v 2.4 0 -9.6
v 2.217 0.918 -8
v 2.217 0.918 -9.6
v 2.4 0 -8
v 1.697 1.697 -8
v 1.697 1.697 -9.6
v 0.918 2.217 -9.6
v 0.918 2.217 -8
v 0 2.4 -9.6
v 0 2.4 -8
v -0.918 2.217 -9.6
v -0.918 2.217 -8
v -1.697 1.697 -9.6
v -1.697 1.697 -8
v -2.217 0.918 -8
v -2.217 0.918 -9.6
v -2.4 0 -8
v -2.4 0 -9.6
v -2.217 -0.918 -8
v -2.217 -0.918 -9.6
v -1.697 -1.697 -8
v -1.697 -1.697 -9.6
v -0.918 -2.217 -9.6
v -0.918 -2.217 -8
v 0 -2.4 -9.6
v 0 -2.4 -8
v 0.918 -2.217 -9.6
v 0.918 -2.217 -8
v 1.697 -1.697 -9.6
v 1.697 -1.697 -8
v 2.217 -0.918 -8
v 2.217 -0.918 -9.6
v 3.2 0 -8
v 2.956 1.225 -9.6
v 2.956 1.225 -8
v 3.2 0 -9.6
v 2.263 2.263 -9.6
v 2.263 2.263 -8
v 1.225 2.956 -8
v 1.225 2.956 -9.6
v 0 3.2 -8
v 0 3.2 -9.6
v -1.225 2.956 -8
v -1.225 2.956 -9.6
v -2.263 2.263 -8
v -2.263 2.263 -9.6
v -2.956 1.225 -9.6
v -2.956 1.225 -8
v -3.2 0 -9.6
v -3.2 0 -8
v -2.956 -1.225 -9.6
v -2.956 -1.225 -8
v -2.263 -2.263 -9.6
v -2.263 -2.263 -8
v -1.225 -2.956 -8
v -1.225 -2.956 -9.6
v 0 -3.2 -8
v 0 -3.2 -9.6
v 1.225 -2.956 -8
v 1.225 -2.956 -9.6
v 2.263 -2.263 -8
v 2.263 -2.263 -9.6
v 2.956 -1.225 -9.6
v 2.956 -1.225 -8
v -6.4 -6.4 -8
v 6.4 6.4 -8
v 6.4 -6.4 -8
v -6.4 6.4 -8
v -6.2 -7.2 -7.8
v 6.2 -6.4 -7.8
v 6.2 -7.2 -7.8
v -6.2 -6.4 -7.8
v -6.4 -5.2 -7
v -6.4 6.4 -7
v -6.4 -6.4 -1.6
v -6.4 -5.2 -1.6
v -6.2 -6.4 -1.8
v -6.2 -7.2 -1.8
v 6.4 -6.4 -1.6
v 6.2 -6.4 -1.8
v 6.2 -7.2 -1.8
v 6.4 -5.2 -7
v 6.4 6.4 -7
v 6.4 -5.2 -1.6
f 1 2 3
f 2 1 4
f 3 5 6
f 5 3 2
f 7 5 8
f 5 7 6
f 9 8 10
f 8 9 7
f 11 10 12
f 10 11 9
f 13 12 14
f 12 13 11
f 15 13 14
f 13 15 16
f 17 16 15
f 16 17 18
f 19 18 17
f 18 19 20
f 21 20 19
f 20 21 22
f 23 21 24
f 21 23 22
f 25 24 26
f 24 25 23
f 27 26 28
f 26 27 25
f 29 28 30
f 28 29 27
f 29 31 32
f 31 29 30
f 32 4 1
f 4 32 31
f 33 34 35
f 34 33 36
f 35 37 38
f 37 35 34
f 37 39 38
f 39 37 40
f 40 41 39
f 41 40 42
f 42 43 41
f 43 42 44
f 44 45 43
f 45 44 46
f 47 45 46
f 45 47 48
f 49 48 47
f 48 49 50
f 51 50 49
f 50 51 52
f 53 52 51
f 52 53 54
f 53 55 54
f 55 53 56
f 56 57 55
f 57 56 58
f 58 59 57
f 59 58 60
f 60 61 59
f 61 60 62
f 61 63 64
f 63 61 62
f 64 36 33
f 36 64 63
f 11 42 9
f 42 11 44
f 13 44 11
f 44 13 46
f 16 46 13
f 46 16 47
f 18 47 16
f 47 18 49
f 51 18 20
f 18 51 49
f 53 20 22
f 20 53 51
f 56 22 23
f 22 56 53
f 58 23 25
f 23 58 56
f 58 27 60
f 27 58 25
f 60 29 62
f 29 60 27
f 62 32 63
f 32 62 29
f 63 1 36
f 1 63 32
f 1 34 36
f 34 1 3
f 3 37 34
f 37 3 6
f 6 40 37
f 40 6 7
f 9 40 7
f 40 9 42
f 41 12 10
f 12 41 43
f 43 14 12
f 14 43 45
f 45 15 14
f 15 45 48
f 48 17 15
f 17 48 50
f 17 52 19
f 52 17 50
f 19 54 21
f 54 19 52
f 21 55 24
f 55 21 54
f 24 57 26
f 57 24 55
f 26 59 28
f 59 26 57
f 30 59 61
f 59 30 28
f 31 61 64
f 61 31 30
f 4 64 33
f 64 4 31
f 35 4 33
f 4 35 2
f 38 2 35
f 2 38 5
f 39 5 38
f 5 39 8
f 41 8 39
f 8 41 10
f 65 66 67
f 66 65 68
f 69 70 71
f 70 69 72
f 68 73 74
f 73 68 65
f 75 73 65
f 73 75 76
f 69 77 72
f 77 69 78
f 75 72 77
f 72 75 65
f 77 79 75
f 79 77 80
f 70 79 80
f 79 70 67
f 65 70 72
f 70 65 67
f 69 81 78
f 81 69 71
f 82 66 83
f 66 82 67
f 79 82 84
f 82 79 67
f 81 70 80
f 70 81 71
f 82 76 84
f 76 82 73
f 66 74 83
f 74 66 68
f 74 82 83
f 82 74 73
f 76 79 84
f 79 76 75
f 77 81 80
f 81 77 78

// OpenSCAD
// file: ../p/4-4ring3.scad
use <../lib.scad>
function ldraw_lib__4_4ring3() = [
// 0 Ring  3 x 1.0
// 0 Name: 4-4ring3.dat
// 0 Author: James Jessiman
// 0 !LDRAW_ORG Primitive UPDATE 2009-01
// 0 !LICENSE Licensed under CC BY 4.0 : see CAreadme.txt
// 
// 0 BFC CERTIFY CCW
  [0,"BFC","CERTIFY"],
  [0,"BFC","CCW"],
// 
// 0 !HISTORY 1998-12-15 [PTadmin] Official Update 1998-10
// 0 !HISTORY 2002-04-05 [hafhead] Added BFC statement
// 0 !HISTORY 2002-04-25 [PTadmin] Official Update 2002-02
// 0 !HISTORY 2007-06-24 [PTadmin] Header formatted for Contributor Agreement
// 0 !HISTORY 2008-07-01 [PTadmin] Official Update 2008-01
// 0 !HISTORY 2008-08-26 [cwdee] Switch polygon winding and rename
// 0 !HISTORY 2009-05-02 [PTadmin] Official Update 2009-01
// 
// 
// 4 16 -1.5308 0 3.6956 -1.1481 0 2.7717 0 0 3 0 0 4
  [4,16,-1.5308,0,3.6956,-1.1481,0,2.7717,0,0,3,0,0,4],
// 4 16 -2.8284 0 2.8284 -2.1213 0 2.1213 -1.1481 0 2.7717 -1.5308 0 3.6956
  [4,16,-2.8284,0,2.8284,-2.1213,0,2.1213,-1.1481,0,2.7717,-1.5308,0,3.6956],
// 4 16 -3.6956 0 1.5308 -2.7717 0 1.1481 -2.1213 0 2.1213 -2.8284 0 2.8284
  [4,16,-3.6956,0,1.5308,-2.7717,0,1.1481,-2.1213,0,2.1213,-2.8284,0,2.8284],
// 4 16 -4 0 0 -3 0 0 -2.7717 0 1.1481 -3.6956 0 1.5308
  [4,16,-4,0,0,-3,0,0,-2.7717,0,1.1481,-3.6956,0,1.5308],
// 4 16 -3.6956 0 -1.5308 -2.7717 0 -1.1481 -3 0 0 -4 0 0
  [4,16,-3.6956,0,-1.5308,-2.7717,0,-1.1481,-3,0,0,-4,0,0],
// 4 16 -2.8284 0 -2.8284 -2.1213 0 -2.1213 -2.7717 0 -1.1481 -3.6956 0 -1.5308
  [4,16,-2.8284,0,-2.8284,-2.1213,0,-2.1213,-2.7717,0,-1.1481,-3.6956,0,-1.5308],
// 4 16 -1.5308 0 -3.6956 -1.1481 0 -2.7717 -2.1213 0 -2.1213 -2.8284 0 -2.8284
  [4,16,-1.5308,0,-3.6956,-1.1481,0,-2.7717,-2.1213,0,-2.1213,-2.8284,0,-2.8284],
// 4 16 0 0 -4 0 0 -3 -1.1481 0 -2.7717 -1.5308 0 -3.6956
  [4,16,0,0,-4,0,0,-3,-1.1481,0,-2.7717,-1.5308,0,-3.6956],
// 4 16 1.5308 0 -3.6956 1.1481 0 -2.7717 0 0 -3 0 0 -4
  [4,16,1.5308,0,-3.6956,1.1481,0,-2.7717,0,0,-3,0,0,-4],
// 4 16 2.8284 0 -2.8284 2.1213 0 -2.1213 1.1481 0 -2.7717 1.5308 0 -3.6956
  [4,16,2.8284,0,-2.8284,2.1213,0,-2.1213,1.1481,0,-2.7717,1.5308,0,-3.6956],
// 4 16 3.6956 0 -1.5308 2.7717 0 -1.1481 2.1213 0 -2.1213 2.8284 0 -2.8284
  [4,16,3.6956,0,-1.5308,2.7717,0,-1.1481,2.1213,0,-2.1213,2.8284,0,-2.8284],
// 4 16 4 0 0 3 0 0 2.7717 0 -1.1481 3.6956 0 -1.5308
  [4,16,4,0,0,3,0,0,2.7717,0,-1.1481,3.6956,0,-1.5308],
// 4 16 3.6956 0 1.5308 2.7717 0 1.1481 3 0 0 4 0 0
  [4,16,3.6956,0,1.5308,2.7717,0,1.1481,3,0,0,4,0,0],
// 4 16 2.8284 0 2.8284 2.1213 0 2.1213 2.7717 0 1.1481 3.6956 0 1.5308
  [4,16,2.8284,0,2.8284,2.1213,0,2.1213,2.7717,0,1.1481,3.6956,0,1.5308],
// 4 16 1.5308 0 3.6956 1.1481 0 2.7717 2.1213 0 2.1213 2.8284 0 2.8284
  [4,16,1.5308,0,3.6956,1.1481,0,2.7717,2.1213,0,2.1213,2.8284,0,2.8284],
// 4 16 0 0 4 0 0 3 1.1481 0 2.7717 1.5308 0 3.6956
  [4,16,0,0,4,0,0,3,1.1481,0,2.7717,1.5308,0,3.6956],
// 0
];
module ldraw_lib__4_4ring3(step=0, col=false, unit=2/5, alt=false, line=0.2, solid=!$preview)
    makepoly(ldraw_lib__4_4ring3(), step=step, col=col, unit=unit, alt=alt, line=line, solid=solid);
ldraw_lib__4_4ring3(line=0.2);
// file: ../p/4-4edge.scad
use <../lib.scad>
function ldraw_lib__4_4edge() = [
// 0 Circle 1.0
// 0 Name: 4-4edge.dat
// 0 Author: James Jessiman
// 0 !LDRAW_ORG Primitive UPDATE 2017-01
// 0 !LICENSE Licensed under CC BY 2.0 and CC BY 4.0 : see CAreadme.txt
// 
// 0 BFC CERTIFY CCW
  [0,"BFC","CERTIFY"],
  [0,"BFC","CCW"],
// 
// 0 !HISTORY 1998-12-15 [PTadmin] Official Update 1998-10
// 0 !HISTORY 2005-12-28 [PTadmin] Official Update 2005-01
// 0 !HISTORY 2007-06-24 [PTadmin] Header formatted for Contributor Agreement
// 0 !HISTORY 2008-07-01 [PTadmin] Official Update 2008-01
// 0 !HISTORY 2017-01-15 [Steffen] BFCed
// 0 !HISTORY 2017-12-30 [PTadmin] Official Update 2017-01
// 
// 
// 2 24 1 0 0 0.9239 0 0.3827
  [2,24,1,0,0,0.9239,0,0.3827],
// 2 24 0.9239 0 0.3827 0.7071 0 0.7071
  [2,24,0.9239,0,0.3827,0.7071,0,0.7071],
// 2 24 0.7071 0 0.7071 0.3827 0 0.9239
  [2,24,0.7071,0,0.7071,0.3827,0,0.9239],
// 2 24 0.3827 0 0.9239 0 0 1
  [2,24,0.3827,0,0.9239,0,0,1],
// 2 24 0 0 1 -0.3827 0 0.9239
  [2,24,0,0,1,-0.3827,0,0.9239],
// 2 24 -0.3827 0 0.9239 -0.7071 0 0.7071
  [2,24,-0.3827,0,0.9239,-0.7071,0,0.7071],
// 2 24 -0.7071 0 0.7071 -0.9239 0 0.3827
  [2,24,-0.7071,0,0.7071,-0.9239,0,0.3827],
// 2 24 -0.9239 0 0.3827 -1 0 -0
  [2,24,-0.9239,0,0.3827,-1,0,-0],
// 2 24 -1 0 -0 -0.9239 0 -0.3827
  [2,24,-1,0,-0,-0.9239,0,-0.3827],
// 2 24 -0.9239 0 -0.3827 -0.7071 0 -0.7071
  [2,24,-0.9239,0,-0.3827,-0.7071,0,-0.7071],
// 2 24 -0.7071 0 -0.7071 -0.3827 0 -0.9239
  [2,24,-0.7071,0,-0.7071,-0.3827,0,-0.9239],
// 2 24 -0.3827 0 -0.9239 0 0 -1
  [2,24,-0.3827,0,-0.9239,0,0,-1],
// 2 24 0 0 -1 0.3827 0 -0.9239
  [2,24,0,0,-1,0.3827,0,-0.9239],
// 2 24 0.3827 0 -0.9239 0.7071 0 -0.7071
  [2,24,0.3827,0,-0.9239,0.7071,0,-0.7071],
// 2 24 0.7071 0 -0.7071 0.9239 0 -0.3827
  [2,24,0.7071,0,-0.7071,0.9239,0,-0.3827],
// 2 24 0.9239 0 -0.3827 1 0 0
  [2,24,0.9239,0,-0.3827,1,0,0],
];
module ldraw_lib__4_4edge(step=0, col=false, unit=2/5, alt=false, line=0.2, solid=!$preview)
    makepoly(ldraw_lib__4_4edge(), step=step, col=col, unit=unit, alt=alt, line=line, solid=solid);
ldraw_lib__4_4edge(line=0.2);
// file: ../p/4-4cyli.scad
use <../lib.scad>
function ldraw_lib__4_4cyli() = [
// 0 Cylinder 1.0
// 0 Name: 4-4cyli.dat
// 0 Author: James Jessiman
// 0 !LDRAW_ORG Primitive UPDATE 2005-01
// 0 !LICENSE Licensed under CC BY 4.0 : see CAreadme.txt
// 
// 0 BFC CERTIFY CCW
  [0,"BFC","CERTIFY"],
  [0,"BFC","CCW"],
// 
// 0 !HISTORY 1998-12-15 [PTadmin] Official Update 1998-10
// 0 !HISTORY 2002-03-23 [sbliss] Added BFC statement; merged headers from files in distributions LDraw 0.27 and Complete.
// 0 !HISTORY 2002-04-25 [PTadmin] Official Update 2002-02
// 0 !HISTORY 2004-12-14 [guyvivan] BFC CCW
// 0 !HISTORY 2005-12-28 [PTadmin] Official Update 2005-01
// 0 !HISTORY 2007-06-24 [PTadmin] Header formatted for Contributor Agreement
// 0 !HISTORY 2008-07-01 [PTadmin] Official Update 2008-01
// 
// 
// 4 16 1 1 0 0.9239 1 0.3827 0.9239 0 0.3827 1 0 0
  [4,16,1,1,0,0.9239,1,0.3827,0.9239,0,0.3827,1,0,0],
// 5 24 1 0 0 1 1 0 0.9239 0 0.3827 0.9239 0 -0.3827
  [5,24,1,0,0,1,1,0,0.9239,0,0.3827,0.9239,0,-0.3827],
// 4 16 0.9239 1 0.3827 0.7071 1 0.7071 0.7071 0 0.7071 0.9239 0 0.3827
  [4,16,0.9239,1,0.3827,0.7071,1,0.7071,0.7071,0,0.7071,0.9239,0,0.3827],
// 5 24 0.9239 0 0.3827 0.9239 1 0.3827 0.7071 0 0.7071 1 0 0
  [5,24,0.9239,0,0.3827,0.9239,1,0.3827,0.7071,0,0.7071,1,0,0],
// 4 16 0.7071 1 0.7071 0.3827 1 0.9239 0.3827 0 0.9239 0.7071 0 0.7071
  [4,16,0.7071,1,0.7071,0.3827,1,0.9239,0.3827,0,0.9239,0.7071,0,0.7071],
// 5 24 0.7071 0 0.7071 0.7071 1 0.7071 0.3827 0 0.9239 0.9239 0 0.3827
  [5,24,0.7071,0,0.7071,0.7071,1,0.7071,0.3827,0,0.9239,0.9239,0,0.3827],
// 4 16 0.3827 1 0.9239 0 1 1 0 0 1 0.3827 0 0.9239
  [4,16,0.3827,1,0.9239,0,1,1,0,0,1,0.3827,0,0.9239],
// 5 24 0.3827 0 0.9239 0.3827 1 0.9239 0 0 1 0.7071 0 0.7071
  [5,24,0.3827,0,0.9239,0.3827,1,0.9239,0,0,1,0.7071,0,0.7071],
// 4 16 0 1 1 -0.3827 1 0.9239 -0.3827 0 0.9239 0 0 1
  [4,16,0,1,1,-0.3827,1,0.9239,-0.3827,0,0.9239,0,0,1],
// 5 24 0 0 1 0 1 1 -0.3827 0 0.9239 0.3827 0 0.9239
  [5,24,0,0,1,0,1,1,-0.3827,0,0.9239,0.3827,0,0.9239],
// 4 16 -0.3827 1 0.9239 -0.7071 1 0.7071 -0.7071 0 0.7071 -0.3827 0 0.9239
  [4,16,-0.3827,1,0.9239,-0.7071,1,0.7071,-0.7071,0,0.7071,-0.3827,0,0.9239],
// 5 24 -0.3827 0 0.9239 -0.3827 1 0.9239 -0.7071 0 0.7071 0 0 1
  [5,24,-0.3827,0,0.9239,-0.3827,1,0.9239,-0.7071,0,0.7071,0,0,1],
// 4 16 -0.7071 1 0.7071 -0.9239 1 0.3827 -0.9239 0 0.3827 -0.7071 0 0.7071
  [4,16,-0.7071,1,0.7071,-0.9239,1,0.3827,-0.9239,0,0.3827,-0.7071,0,0.7071],
// 5 24 -0.7071 0 0.7071 -0.7071 1 0.7071 -0.9239 0 0.3827 -0.3827 0 0.9239
  [5,24,-0.7071,0,0.7071,-0.7071,1,0.7071,-0.9239,0,0.3827,-0.3827,0,0.9239],
// 4 16 -0.9239 1 0.3827 -1 1 0 -1 0 0 -0.9239 0 0.3827
  [4,16,-0.9239,1,0.3827,-1,1,0,-1,0,0,-0.9239,0,0.3827],
// 5 24 -0.9239 0 0.3827 -0.9239 1 0.3827 -1 0 0 -0.7071 0 0.7071
  [5,24,-0.9239,0,0.3827,-0.9239,1,0.3827,-1,0,0,-0.7071,0,0.7071],
// 4 16 -1 1 0 -0.9239 1 -0.3827 -0.9239 0 -0.3827 -1 0 0
  [4,16,-1,1,0,-0.9239,1,-0.3827,-0.9239,0,-0.3827,-1,0,0],
// 5 24 -1 0 0 -1 1 0 -0.9239 0 -0.3827 -0.9239 0 0.3827
  [5,24,-1,0,0,-1,1,0,-0.9239,0,-0.3827,-0.9239,0,0.3827],
// 4 16 -0.9239 1 -0.3827 -0.7071 1 -0.7071 -0.7071 0 -0.7071 -0.9239 0 -0.3827
  [4,16,-0.9239,1,-0.3827,-0.7071,1,-0.7071,-0.7071,0,-0.7071,-0.9239,0,-0.3827],
// 5 24 -0.9239 0 -0.3827 -0.9239 1 -0.3827 -0.7071 0 -0.7071 -1 0 0
  [5,24,-0.9239,0,-0.3827,-0.9239,1,-0.3827,-0.7071,0,-0.7071,-1,0,0],
// 4 16 -0.7071 1 -0.7071 -0.3827 1 -0.9239 -0.3827 0 -0.9239 -0.7071 0 -0.7071
  [4,16,-0.7071,1,-0.7071,-0.3827,1,-0.9239,-0.3827,0,-0.9239,-0.7071,0,-0.7071],
// 5 24 -0.7071 0 -0.7071 -0.7071 1 -0.7071 -0.3827 0 -0.9239 -0.9239 0 -0.3827
  [5,24,-0.7071,0,-0.7071,-0.7071,1,-0.7071,-0.3827,0,-0.9239,-0.9239,0,-0.3827],
// 4 16 -0.3827 1 -0.9239 0 1 -1 0 0 -1 -0.3827 0 -0.9239
  [4,16,-0.3827,1,-0.9239,0,1,-1,0,0,-1,-0.3827,0,-0.9239],
// 5 24 -0.3827 0 -0.9239 -0.3827 1 -0.9239 0 0 -1 -0.7071 0 -0.7071
  [5,24,-0.3827,0,-0.9239,-0.3827,1,-0.9239,0,0,-1,-0.7071,0,-0.7071],
// 4 16 0 1 -1 0.3827 1 -0.9239 0.3827 0 -0.9239 0 0 -1
  [4,16,0,1,-1,0.3827,1,-0.9239,0.3827,0,-0.9239,0,0,-1],
// 5 24 0 0 -1 0 1 -1 0.3827 0 -0.9239 -0.3827 0 -0.9239
  [5,24,0,0,-1,0,1,-1,0.3827,0,-0.9239,-0.3827,0,-0.9239],
// 4 16 0.3827 1 -0.9239 0.7071 1 -0.7071 0.7071 0 -0.7071 0.3827 0 -0.9239
  [4,16,0.3827,1,-0.9239,0.7071,1,-0.7071,0.7071,0,-0.7071,0.3827,0,-0.9239],
// 5 24 0.3827 0 -0.9239 0.3827 1 -0.9239 0.7071 0 -0.7071 0 0 -1
  [5,24,0.3827,0,-0.9239,0.3827,1,-0.9239,0.7071,0,-0.7071,0,0,-1],
// 4 16 0.7071 1 -0.7071 0.9239 1 -0.3827 0.9239 0 -0.3827 0.7071 0 -0.7071
  [4,16,0.7071,1,-0.7071,0.9239,1,-0.3827,0.9239,0,-0.3827,0.7071,0,-0.7071],
// 5 24 0.7071 0 -0.7071 0.7071 1 -0.7071 0.9239 0 -0.3827 0.3827 0 -0.9239
  [5,24,0.7071,0,-0.7071,0.7071,1,-0.7071,0.9239,0,-0.3827,0.3827,0,-0.9239],
// 4 16 0.9239 1 -0.3827 1 1 0 1 0 0 0.9239 0 -0.3827
  [4,16,0.9239,1,-0.3827,1,1,0,1,0,0,0.9239,0,-0.3827],
// 5 24 0.9239 0 -0.3827 0.9239 1 -0.3827 1 0 0 0.7071 0 -0.7071
  [5,24,0.9239,0,-0.3827,0.9239,1,-0.3827,1,0,0,0.7071,0,-0.7071],
// 0
];
module ldraw_lib__4_4cyli(step=0, col=false, unit=2/5, alt=false, line=0.2, solid=!$preview)
    makepoly(ldraw_lib__4_4cyli(), step=step, col=col, unit=unit, alt=alt, line=line, solid=solid);
ldraw_lib__4_4cyli(line=0.2);
// file: ../p/stud4.scad
use <../lib.scad>
use <4-4cyli.scad>
use <4-4edge.scad>
use <4-4ring3.scad>
function ldraw_lib__stud4() = [
// 0 Stud Tube Open
// 0 Name: stud4.dat
// 0 Author: James Jessiman
// 0 !LDRAW_ORG Primitive UPDATE 2009-02
// 0 !LICENSE Licensed under CC BY 4.0 : see CAreadme.txt
// 
// 0 BFC CERTIFY CCW
  [0,"BFC","CERTIFY"],
  [0,"BFC","CCW"],
// 
// 0 !HISTORY 1999-07-05 [PTadmin] Official Update 1999-05
// 0 !HISTORY 2002-04-04 [sbliss] Modified for BFC compliance
// 0 !HISTORY 2002-04-25 [PTadmin] Official Update 2002-02
// 0 !HISTORY 2007-06-24 [PTadmin] Header formatted for Contributor Agreement
// 0 !HISTORY 2008-07-01 [PTadmin] Official Update 2008-01
// 0 !HISTORY 2009-06-21 [cwdee] Update ring references to 4-4ring
// 0 !HISTORY 2009-09-03 [PTadmin] Official Update 2009-02
// 
// 
// 1 16 0 -4 0 6 0 0 0 1 0 0 0 6 4-4edge.dat
  [1,16,0,-4,0,6,0,0,0,1,0,0,0,6, ldraw_lib__4_4edge()],
// 1 16 0 -4 0 8 0 0 0 1 0 0 0 8 4-4edge.dat
  [1,16,0,-4,0,8,0,0,0,1,0,0,0,8, ldraw_lib__4_4edge()],
// 1 16 0 0 0 6 0 0 0 1 0 0 0 6 4-4edge.dat
  [1,16,0,0,0,6,0,0,0,1,0,0,0,6, ldraw_lib__4_4edge()],
// 1 16 0 0 0 8 0 0 0 1 0 0 0 8 4-4edge.dat
  [1,16,0,0,0,8,0,0,0,1,0,0,0,8, ldraw_lib__4_4edge()],
// 0 BFC INVERTNEXT
  [0,"BFC","INVERTNEXT"],
// 1 16 0 -4 0 6 0 0 0 4 0 0 0 6 4-4cyli.dat
  [1,16,0,-4,0,6,0,0,0,4,0,0,0,6, ldraw_lib__4_4cyli()],
// 1 16 0 -4 0 8 0 0 0 4 0 0 0 8 4-4cyli.dat
  [1,16,0,-4,0,8,0,0,0,4,0,0,0,8, ldraw_lib__4_4cyli()],
// 1 16 0 -4 0 2 0 0 0 1 0 0 0 2 4-4ring3.dat
  [1,16,0,-4,0,2,0,0,0,1,0,0,0,2, ldraw_lib__4_4ring3()],
  [-1,16,0,0,0,2,0,0,0,-1,0,0,0,2, ldraw_lib__4_4ring3()],
// 0
];
module ldraw_lib__stud4(step=0, col=false, unit=2/5, alt=false, line=0.2, solid=!$preview)
    makepoly(ldraw_lib__stud4(), step=step, col=col, unit=unit, alt=alt, line=line, solid=solid);
ldraw_lib__stud4(line=0.2);
// main file
use <../lib.scad>
use <../p/stud4.scad>
function ldraw_lib__267a() = [
// 0 ~Electric Lightbrick  2 x  2 Type 1 Insert
// 0 Name: 267a.dat
// 0 Author: Niels Karsdorp [nielsk]
// 0 !LDRAW_ORG Part UPDATE 2010-02
// 0 !LICENSE Licensed under CC BY 4.0 : see CAreadme.txt
// 
// 0 BFC CERTIFY CW
  [0,"BFC","CERTIFY"],
  [0,"BFC","CW"],
// 
// 0 !HISTORY 2009-12-29 [PTadmin] Official Update 2009-03
// 0 !HISTORY 2010-04-25 [PTadmin] Renamed from 267
// 0 !HISTORY 2010-07-05 [PTadmin] Official Update 2010-02
// 
// 
// 0 // Bottom
// 
// 1 16 0 20 0 1 0 0 0 -1 0 0 0 1 stud4.dat
  [1,16,0,20,0,1,0,0,0,-1,0,0,0,1, ldraw_lib__stud4()],
// 4 16 -16 20 16 -16 20 -16 16 20 -16 16 20 16
  [4,16,-16,20,16,-16,20,-16,16,20,-16,16,20,16],
// 4 16 -15.5 19.5 -16 -15.5 19.5 -18 15.5 19.5 -18 15.5 19.5 -16
  [4,16,-15.5,19.5,-16,-15.5,19.5,-18,15.5,19.5,-18,15.5,19.5,-16],
// 0 Left
// 4 16 -16 20 16 -16 17.5 16 -16 17.5 -13 -16 20 -16
  [4,16,-16,20,16,-16,17.5,16,-16,17.5,-13,-16,20,-16],
// 4 16 -16 17.5 -13 -16 4 -13 -16 4 -16 -16 20 -16
  [4,16,-16,17.5,-13,-16,4,-13,-16,4,-16,-16,20,-16],
// 4 16 -15.5 19.5 -16 -15.5 4.5 -16 -15.5 4.5 -18 -15.5 19.5 -18
  [4,16,-15.5,19.5,-16,-15.5,4.5,-16,-15.5,4.5,-18,-15.5,19.5,-18],
// 0 Front
// 4 16 -16 20 -16 -16 4 -16 -15.5 4.5 -16 -15.5 19.5 -16
  [4,16,-16,20,-16,-16,4,-16,-15.5,4.5,-16,-15.5,19.5,-16],
// 4 16 -16 4 -16 16 4 -16 15.5 4.5 -16 -15.5 4.5 -16
  [4,16,-16,4,-16,16,4,-16,15.5,4.5,-16,-15.5,4.5,-16],
// 4 16 16 4 -16 16 20 -16 15.5 19.5 -16 15.5 4.5 -16
  [4,16,16,4,-16,16,20,-16,15.5,19.5,-16,15.5,4.5,-16],
// 4 16 16 20 -16 -16 20 -16 -15.5 19.5 -16 15.5 19.5 -16
  [4,16,16,20,-16,-16,20,-16,-15.5,19.5,-16,15.5,19.5,-16],
// 4 16 -15.5 4.5 -18 15.5 4.5 -18 15.5 19.5 -18 -15.5 19.5 -18
  [4,16,-15.5,4.5,-18,15.5,4.5,-18,15.5,19.5,-18,-15.5,19.5,-18],
// 0 Right
// 4 16 16 20 -16 16 17.5 -13 16 17.5 16 16 20 16
  [4,16,16,20,-16,16,17.5,-13,16,17.5,16,16,20,16],
// 4 16 16 20 -16 16 4 -16 16 4 -13 16 17.5 -13
  [4,16,16,20,-16,16,4,-16,16,4,-13,16,17.5,-13],
// 4 16 15.5 19.5 -18 15.5 4.5 -18 15.5 4.5 -16 15.5 19.5 -16
  [4,16,15.5,19.5,-18,15.5,4.5,-18,15.5,4.5,-16,15.5,19.5,-16],
// 0 Back
// 4 16 16 4 -13 -16 4 -13 -16 17.5 -13 16 17.5 -13
  [4,16,16,4,-13,-16,4,-13,-16,17.5,-13,16,17.5,-13],
// 4 16 16 20 16 16 17.5 16 -16 17.5 16 -16 20 16
  [4,16,16,20,16,16,17.5,16,-16,17.5,16,-16,20,16],
// 0 Top
// 4 16 16 17.5 -13 -16 17.5 -13 -16 17.5 16 16 17.5 16
  [4,16,16,17.5,-13,-16,17.5,-13,-16,17.5,16,16,17.5,16],
// 4 16 16 4 -16 -16 4 -16 -16 4 -13 16 4 -13
  [4,16,16,4,-16,-16,4,-16,-16,4,-13,16,4,-13],
// 4 16 15.5 4.5 -18 -15.5 4.5 -18 -15.5 4.5 -16 15.5 4.5 -16
  [4,16,15.5,4.5,-18,-15.5,4.5,-18,-15.5,4.5,-16,15.5,4.5,-16],
// 0 Lines bottom
// 2 24 16 20 16 16 20 -16
  [2,24,16,20,16,16,20,-16],
// 2 24 16 20 -16 -16 20 -16
  [2,24,16,20,-16,-16,20,-16],
// 2 24 -16 20 -16 -16 20 16
  [2,24,-16,20,-16,-16,20,16],
// 2 24 -16 20 16 16 20 16
  [2,24,-16,20,16,16,20,16],
// 2 24 -15.5 19.5 -16 15.5 19.5 -16
  [2,24,-15.5,19.5,-16,15.5,19.5,-16],
// 2 24 -15.5 19.5 -18 15.5 19.5 -18
  [2,24,-15.5,19.5,-18,15.5,19.5,-18],
// 0 Lines left
// 2 24 -16 20 16 -16 17.5 16
  [2,24,-16,20,16,-16,17.5,16],
// 2 24 -16 17.5 16 -16 17.5 -13
  [2,24,-16,17.5,16,-16,17.5,-13],
// 2 24 -16 17.5 -13 -16 4 -13
  [2,24,-16,17.5,-13,-16,4,-13],
// 2 24 -16 4 -13 -16 4 -16
  [2,24,-16,4,-13,-16,4,-16],
// 2 24 -16 4 -16 -16 20 -16
  [2,24,-16,4,-16,-16,20,-16],
// 2 24 -15.5 19.5 -16 -15.5 4.5 -16
  [2,24,-15.5,19.5,-16,-15.5,4.5,-16],
// 2 24 -15.5 4.5 -16 -15.5 4.5 -18
  [2,24,-15.5,4.5,-16,-15.5,4.5,-18],
// 2 24 -15.5 4.5 -18 -15.5 19.5 -18
  [2,24,-15.5,4.5,-18,-15.5,19.5,-18],
// 2 24 -15.5 19.5 -18 -15.5 19.5 -16
  [2,24,-15.5,19.5,-18,-15.5,19.5,-16],
// 0 Lines right
// 2 24 16 20 -16 16 4 -16
  [2,24,16,20,-16,16,4,-16],
// 2 24 16 4 -16 16 4 -13
  [2,24,16,4,-16,16,4,-13],
// 2 24 16 4 -13 16 17.5 -13
  [2,24,16,4,-13,16,17.5,-13],
// 2 24 16 17.5 -13 16 17.5 16
  [2,24,16,17.5,-13,16,17.5,16],
// 2 24 16 17.5 16 16 20 16
  [2,24,16,17.5,16,16,20,16],
// 2 24 15.5 19.5 -16 15.5 19.5 -18
  [2,24,15.5,19.5,-16,15.5,19.5,-18],
// 2 24 15.5 19.5 -18 15.5 4.5 -18
  [2,24,15.5,19.5,-18,15.5,4.5,-18],
// 2 24 15.5 4.5 -18 15.5 4.5 -16
  [2,24,15.5,4.5,-18,15.5,4.5,-16],
// 2 24 15.5 4.5 -16 15.5 19.5 -16
  [2,24,15.5,4.5,-16,15.5,19.5,-16],
// 0 Lines top
// 2 24 16 17.5 16 -16 17.5 16
  [2,24,16,17.5,16,-16,17.5,16],
// 2 24 16 17.5 -13 -16 17.5 -13
  [2,24,16,17.5,-13,-16,17.5,-13],
// 2 24 16 4 -13 -16 4 -13
  [2,24,16,4,-13,-16,4,-13],
// 2 24 16 4 -16 -16 4 -16
  [2,24,16,4,-16,-16,4,-16],
// 2 24 -15.5 4.5 -16 15.5 4.5 -16
  [2,24,-15.5,4.5,-16,15.5,4.5,-16],
// 2 24 -15.5 4.5 -18 15.5 4.5 -18
  [2,24,-15.5,4.5,-18,15.5,4.5,-18],
// 0
];
module ldraw_lib__267a(step=0, col=false, unit=2/5, alt=false, line=0.2, solid=!$preview)
    makepoly(ldraw_lib__267a(), step=step, col=col, unit=unit, alt=alt, line=line, solid=solid);
ldraw_lib__267a(line=0.2);
